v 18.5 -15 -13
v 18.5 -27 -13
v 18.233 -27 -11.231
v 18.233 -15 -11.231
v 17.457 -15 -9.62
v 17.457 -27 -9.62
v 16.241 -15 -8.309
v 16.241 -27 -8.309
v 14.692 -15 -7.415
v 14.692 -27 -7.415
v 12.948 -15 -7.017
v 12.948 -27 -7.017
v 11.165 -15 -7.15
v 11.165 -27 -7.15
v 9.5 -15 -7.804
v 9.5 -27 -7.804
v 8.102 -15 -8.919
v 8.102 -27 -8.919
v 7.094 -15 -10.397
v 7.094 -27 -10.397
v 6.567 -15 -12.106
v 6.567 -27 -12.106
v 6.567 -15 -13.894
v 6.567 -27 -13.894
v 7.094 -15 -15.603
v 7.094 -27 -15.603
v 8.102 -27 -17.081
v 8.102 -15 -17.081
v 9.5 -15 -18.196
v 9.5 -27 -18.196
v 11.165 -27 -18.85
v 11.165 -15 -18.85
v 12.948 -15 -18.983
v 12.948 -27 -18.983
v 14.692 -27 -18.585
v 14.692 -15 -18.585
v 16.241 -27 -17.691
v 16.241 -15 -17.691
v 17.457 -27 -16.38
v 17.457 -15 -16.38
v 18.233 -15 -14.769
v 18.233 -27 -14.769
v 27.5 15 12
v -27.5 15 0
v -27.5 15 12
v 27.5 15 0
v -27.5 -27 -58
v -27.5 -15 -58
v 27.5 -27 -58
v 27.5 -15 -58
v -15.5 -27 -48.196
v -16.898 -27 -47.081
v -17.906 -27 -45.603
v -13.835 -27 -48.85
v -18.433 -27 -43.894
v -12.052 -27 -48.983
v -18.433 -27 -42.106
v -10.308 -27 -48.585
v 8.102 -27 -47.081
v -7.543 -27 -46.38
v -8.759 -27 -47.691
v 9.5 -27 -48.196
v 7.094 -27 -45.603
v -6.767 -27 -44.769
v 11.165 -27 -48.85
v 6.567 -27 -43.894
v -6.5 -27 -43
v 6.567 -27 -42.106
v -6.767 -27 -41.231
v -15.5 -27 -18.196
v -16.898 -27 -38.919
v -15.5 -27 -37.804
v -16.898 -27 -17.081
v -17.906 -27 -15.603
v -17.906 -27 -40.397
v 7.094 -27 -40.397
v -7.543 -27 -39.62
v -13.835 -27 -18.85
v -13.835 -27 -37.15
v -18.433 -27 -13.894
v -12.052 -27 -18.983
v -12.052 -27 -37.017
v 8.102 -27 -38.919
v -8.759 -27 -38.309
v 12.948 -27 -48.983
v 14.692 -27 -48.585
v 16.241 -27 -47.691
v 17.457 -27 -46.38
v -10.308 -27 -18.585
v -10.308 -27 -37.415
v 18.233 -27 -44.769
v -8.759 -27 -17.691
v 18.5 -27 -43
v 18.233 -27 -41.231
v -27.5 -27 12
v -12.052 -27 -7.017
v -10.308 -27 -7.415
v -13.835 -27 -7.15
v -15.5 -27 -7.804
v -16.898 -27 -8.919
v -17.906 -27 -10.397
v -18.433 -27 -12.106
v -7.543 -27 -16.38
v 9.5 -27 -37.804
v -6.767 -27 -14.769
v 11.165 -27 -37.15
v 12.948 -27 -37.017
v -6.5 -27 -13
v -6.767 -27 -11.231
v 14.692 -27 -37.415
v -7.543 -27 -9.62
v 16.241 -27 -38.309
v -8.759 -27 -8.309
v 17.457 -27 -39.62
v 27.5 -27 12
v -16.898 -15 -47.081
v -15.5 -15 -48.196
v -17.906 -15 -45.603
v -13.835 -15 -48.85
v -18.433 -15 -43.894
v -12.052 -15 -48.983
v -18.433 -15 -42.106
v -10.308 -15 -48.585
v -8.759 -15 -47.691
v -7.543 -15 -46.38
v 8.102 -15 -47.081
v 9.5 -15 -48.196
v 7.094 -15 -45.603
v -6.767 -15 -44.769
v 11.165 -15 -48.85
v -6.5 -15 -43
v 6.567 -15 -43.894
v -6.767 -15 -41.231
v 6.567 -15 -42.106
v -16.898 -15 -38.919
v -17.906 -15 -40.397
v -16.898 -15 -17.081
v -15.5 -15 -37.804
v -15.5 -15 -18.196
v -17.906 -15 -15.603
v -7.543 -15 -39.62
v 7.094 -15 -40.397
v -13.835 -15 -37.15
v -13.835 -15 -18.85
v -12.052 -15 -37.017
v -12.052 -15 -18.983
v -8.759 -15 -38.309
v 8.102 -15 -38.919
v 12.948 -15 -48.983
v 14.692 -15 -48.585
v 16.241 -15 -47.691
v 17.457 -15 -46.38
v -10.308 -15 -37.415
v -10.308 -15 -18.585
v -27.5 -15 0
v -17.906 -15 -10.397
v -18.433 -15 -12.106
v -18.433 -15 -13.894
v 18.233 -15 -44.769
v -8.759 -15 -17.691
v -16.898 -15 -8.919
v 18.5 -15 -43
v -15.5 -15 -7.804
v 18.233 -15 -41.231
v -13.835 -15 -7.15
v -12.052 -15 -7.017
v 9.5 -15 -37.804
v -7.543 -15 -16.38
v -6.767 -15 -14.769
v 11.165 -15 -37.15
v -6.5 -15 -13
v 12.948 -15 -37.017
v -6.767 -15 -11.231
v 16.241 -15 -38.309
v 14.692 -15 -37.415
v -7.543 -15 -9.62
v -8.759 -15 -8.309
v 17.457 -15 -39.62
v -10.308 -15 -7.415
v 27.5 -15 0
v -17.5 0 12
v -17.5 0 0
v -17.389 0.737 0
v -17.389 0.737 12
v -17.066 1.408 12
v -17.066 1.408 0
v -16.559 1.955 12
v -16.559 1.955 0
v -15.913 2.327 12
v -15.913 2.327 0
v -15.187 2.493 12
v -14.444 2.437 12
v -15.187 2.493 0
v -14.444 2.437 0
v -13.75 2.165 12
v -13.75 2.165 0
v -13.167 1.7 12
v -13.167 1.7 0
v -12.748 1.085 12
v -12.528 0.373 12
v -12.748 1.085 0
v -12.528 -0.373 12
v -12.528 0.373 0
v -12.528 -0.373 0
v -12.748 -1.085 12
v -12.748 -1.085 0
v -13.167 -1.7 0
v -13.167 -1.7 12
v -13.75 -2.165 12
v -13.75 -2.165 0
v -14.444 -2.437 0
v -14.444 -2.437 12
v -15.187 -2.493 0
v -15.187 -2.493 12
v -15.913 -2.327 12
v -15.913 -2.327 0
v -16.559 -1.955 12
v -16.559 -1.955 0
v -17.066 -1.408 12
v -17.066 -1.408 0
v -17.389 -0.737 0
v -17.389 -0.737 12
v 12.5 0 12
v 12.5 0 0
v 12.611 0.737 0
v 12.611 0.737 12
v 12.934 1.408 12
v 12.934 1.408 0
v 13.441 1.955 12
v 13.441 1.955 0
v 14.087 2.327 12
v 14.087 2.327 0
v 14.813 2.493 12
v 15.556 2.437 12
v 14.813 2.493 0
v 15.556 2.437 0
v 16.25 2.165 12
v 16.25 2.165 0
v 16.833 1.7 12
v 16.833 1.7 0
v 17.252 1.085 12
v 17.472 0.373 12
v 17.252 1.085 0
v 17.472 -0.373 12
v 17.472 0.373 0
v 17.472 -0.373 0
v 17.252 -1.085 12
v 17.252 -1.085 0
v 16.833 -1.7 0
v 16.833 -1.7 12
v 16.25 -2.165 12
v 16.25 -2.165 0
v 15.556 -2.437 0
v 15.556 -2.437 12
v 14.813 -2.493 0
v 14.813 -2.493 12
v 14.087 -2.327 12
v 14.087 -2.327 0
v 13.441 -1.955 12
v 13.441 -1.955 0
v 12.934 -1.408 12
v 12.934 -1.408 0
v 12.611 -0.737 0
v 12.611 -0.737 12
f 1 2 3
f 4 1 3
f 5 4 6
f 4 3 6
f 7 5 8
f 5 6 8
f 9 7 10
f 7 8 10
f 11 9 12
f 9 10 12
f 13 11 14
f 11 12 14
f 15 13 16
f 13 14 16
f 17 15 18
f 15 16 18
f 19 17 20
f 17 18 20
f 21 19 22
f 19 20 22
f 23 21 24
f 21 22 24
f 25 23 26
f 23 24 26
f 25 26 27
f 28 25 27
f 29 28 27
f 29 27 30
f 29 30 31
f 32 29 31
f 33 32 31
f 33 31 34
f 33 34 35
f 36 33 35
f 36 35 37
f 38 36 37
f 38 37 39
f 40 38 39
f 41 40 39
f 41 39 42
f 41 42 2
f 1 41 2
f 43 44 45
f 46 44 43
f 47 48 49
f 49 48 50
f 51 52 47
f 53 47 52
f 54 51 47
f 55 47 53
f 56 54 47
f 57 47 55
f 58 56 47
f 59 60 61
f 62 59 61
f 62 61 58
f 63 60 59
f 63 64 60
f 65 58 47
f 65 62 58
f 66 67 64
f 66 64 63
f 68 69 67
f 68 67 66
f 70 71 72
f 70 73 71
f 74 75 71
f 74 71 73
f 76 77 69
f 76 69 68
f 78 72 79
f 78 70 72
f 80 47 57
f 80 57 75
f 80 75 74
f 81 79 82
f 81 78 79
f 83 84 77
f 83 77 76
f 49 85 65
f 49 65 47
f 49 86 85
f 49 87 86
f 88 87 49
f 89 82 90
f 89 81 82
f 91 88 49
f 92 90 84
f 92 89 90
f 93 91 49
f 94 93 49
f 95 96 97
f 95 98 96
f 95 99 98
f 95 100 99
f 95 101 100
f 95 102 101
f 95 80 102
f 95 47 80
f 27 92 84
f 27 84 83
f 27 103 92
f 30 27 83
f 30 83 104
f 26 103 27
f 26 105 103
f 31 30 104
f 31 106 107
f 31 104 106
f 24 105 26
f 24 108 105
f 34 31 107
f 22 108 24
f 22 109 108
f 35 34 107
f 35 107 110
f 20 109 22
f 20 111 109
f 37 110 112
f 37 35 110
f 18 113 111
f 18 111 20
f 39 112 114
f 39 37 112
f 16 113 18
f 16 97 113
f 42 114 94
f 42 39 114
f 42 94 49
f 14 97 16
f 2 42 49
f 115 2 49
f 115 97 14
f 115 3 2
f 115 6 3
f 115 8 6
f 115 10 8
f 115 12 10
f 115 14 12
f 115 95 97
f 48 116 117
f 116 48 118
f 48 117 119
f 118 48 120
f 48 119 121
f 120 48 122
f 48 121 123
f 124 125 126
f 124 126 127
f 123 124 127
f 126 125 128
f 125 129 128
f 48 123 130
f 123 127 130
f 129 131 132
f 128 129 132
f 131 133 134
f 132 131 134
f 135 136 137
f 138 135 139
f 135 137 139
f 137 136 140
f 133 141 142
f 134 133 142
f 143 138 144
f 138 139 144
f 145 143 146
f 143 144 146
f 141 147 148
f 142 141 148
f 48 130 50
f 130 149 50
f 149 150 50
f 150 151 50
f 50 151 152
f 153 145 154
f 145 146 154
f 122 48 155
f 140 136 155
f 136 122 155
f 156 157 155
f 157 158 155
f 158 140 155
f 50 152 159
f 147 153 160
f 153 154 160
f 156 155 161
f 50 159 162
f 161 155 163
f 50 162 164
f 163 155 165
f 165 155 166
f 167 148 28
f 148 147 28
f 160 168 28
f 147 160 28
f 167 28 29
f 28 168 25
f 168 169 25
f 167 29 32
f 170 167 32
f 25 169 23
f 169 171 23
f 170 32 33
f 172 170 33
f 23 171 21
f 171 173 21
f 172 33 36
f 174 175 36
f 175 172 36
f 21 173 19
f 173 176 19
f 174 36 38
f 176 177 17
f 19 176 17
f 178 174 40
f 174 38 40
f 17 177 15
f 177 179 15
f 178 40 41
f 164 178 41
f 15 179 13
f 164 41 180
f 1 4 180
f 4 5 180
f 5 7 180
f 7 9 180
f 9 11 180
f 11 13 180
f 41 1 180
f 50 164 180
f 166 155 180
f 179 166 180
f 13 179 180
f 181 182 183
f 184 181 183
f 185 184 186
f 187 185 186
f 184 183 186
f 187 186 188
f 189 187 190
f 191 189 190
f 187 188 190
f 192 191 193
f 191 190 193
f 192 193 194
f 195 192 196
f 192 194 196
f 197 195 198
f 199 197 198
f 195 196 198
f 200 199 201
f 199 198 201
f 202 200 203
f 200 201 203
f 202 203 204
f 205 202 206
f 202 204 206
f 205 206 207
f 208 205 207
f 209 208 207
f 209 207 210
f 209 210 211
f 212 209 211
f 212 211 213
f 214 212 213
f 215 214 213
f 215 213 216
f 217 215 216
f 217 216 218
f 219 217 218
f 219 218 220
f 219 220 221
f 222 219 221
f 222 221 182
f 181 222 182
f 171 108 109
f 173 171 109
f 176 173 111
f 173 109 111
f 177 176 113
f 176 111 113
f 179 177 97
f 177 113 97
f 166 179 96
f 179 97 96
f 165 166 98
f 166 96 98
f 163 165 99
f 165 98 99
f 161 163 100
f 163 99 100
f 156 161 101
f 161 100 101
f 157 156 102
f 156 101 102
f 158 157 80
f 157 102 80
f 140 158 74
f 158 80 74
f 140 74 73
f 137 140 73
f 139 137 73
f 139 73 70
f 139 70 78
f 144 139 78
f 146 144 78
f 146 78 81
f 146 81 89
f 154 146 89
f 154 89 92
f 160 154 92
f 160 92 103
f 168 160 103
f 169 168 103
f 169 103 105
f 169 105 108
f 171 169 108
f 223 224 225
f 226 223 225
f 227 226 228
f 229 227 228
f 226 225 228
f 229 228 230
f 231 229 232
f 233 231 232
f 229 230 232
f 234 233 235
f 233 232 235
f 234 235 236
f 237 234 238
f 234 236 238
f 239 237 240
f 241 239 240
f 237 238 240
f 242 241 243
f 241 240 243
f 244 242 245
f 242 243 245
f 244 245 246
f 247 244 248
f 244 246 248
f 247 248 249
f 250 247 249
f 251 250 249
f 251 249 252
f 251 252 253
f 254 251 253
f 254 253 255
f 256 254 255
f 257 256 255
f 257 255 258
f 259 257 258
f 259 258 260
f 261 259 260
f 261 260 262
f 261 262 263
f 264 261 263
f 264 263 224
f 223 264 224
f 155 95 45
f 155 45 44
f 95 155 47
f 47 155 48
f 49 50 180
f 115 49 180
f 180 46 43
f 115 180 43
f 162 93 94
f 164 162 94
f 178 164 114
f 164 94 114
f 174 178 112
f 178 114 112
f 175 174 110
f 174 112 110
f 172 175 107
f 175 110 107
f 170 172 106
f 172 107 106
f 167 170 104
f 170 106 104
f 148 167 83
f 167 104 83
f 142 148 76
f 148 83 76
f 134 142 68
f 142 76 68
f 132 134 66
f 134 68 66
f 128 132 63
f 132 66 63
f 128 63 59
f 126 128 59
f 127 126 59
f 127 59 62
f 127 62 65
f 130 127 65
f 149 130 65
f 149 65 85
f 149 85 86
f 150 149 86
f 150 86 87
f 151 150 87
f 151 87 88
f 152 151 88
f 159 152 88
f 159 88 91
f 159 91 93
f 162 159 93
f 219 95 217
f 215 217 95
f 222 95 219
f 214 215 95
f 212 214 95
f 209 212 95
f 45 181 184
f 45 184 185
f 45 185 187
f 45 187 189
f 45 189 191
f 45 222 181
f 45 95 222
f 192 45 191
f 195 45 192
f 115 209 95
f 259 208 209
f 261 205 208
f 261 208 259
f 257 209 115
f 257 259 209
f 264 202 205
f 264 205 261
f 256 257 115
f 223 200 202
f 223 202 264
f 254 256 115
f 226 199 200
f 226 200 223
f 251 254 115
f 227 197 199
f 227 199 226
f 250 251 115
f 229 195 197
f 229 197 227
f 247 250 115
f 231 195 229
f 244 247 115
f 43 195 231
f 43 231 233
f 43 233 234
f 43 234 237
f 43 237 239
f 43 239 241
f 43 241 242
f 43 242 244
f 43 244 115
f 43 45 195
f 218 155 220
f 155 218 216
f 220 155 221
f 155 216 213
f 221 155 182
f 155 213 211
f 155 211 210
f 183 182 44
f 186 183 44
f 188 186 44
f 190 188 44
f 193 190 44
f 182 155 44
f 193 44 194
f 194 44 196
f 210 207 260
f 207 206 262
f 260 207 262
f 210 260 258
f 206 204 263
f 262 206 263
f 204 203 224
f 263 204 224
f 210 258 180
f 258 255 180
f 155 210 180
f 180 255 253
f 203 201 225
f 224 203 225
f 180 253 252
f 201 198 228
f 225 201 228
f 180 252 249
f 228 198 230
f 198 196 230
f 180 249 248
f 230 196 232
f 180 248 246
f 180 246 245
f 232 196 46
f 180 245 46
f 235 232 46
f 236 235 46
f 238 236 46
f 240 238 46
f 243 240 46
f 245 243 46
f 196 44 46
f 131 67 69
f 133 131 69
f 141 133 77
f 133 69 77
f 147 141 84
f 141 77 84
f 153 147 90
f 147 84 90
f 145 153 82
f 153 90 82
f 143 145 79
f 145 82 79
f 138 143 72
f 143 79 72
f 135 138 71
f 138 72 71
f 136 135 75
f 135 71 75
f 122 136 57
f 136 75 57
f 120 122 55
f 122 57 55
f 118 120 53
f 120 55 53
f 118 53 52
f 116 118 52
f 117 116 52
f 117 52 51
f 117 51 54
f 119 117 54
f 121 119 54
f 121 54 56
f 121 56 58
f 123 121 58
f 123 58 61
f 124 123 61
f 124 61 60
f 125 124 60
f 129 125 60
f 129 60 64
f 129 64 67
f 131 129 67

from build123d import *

# Parameters (mm, degrees)
F0_W     = 55
F0_H     = 30
F1_DEPTH = 12
F3_D     = 5
F3_DEPTH = 25
F4_W     = 55
F4_H     = 58
F4_H_2   = 12
F5_DEPTH = 12
F7_D     = 12
F7_DEPTH = 12


with BuildPart() as f1:
    # F0 (on Top) → F1 (new body)
    with BuildSketch(Plane.XY):
        Rectangle(F0_W, F0_H)
    extrude(amount=F1_DEPTH)

    # F3
    with Locations(Plane.XY.offset(12)):
        with Locations((-15, 0), (15, 0)):
            Hole(F3_D / 2, depth=F3_DEPTH)

    # F4 (on face) → F5 (join)
    with BuildSketch(Plane.XZ.offset(15)):
        with Locations((0, -29)):
            Rectangle(F4_W, F4_H)
        with Locations((0, 6)):
            Rectangle(F4_W, F4_H_2)
    extrude(amount=F5_DEPTH)

    # F7
    with Locations(Plane(origin=(0, -15, 0), x_dir=(-1, 0, 0), z_dir=(0, 1, 0))):
        with Locations((12.5, -13), (12.5, -43), (-12.5, -43), (-12.5, -13)):
            Hole(F7_D / 2, depth=F7_DEPTH)


solid = f1.part
